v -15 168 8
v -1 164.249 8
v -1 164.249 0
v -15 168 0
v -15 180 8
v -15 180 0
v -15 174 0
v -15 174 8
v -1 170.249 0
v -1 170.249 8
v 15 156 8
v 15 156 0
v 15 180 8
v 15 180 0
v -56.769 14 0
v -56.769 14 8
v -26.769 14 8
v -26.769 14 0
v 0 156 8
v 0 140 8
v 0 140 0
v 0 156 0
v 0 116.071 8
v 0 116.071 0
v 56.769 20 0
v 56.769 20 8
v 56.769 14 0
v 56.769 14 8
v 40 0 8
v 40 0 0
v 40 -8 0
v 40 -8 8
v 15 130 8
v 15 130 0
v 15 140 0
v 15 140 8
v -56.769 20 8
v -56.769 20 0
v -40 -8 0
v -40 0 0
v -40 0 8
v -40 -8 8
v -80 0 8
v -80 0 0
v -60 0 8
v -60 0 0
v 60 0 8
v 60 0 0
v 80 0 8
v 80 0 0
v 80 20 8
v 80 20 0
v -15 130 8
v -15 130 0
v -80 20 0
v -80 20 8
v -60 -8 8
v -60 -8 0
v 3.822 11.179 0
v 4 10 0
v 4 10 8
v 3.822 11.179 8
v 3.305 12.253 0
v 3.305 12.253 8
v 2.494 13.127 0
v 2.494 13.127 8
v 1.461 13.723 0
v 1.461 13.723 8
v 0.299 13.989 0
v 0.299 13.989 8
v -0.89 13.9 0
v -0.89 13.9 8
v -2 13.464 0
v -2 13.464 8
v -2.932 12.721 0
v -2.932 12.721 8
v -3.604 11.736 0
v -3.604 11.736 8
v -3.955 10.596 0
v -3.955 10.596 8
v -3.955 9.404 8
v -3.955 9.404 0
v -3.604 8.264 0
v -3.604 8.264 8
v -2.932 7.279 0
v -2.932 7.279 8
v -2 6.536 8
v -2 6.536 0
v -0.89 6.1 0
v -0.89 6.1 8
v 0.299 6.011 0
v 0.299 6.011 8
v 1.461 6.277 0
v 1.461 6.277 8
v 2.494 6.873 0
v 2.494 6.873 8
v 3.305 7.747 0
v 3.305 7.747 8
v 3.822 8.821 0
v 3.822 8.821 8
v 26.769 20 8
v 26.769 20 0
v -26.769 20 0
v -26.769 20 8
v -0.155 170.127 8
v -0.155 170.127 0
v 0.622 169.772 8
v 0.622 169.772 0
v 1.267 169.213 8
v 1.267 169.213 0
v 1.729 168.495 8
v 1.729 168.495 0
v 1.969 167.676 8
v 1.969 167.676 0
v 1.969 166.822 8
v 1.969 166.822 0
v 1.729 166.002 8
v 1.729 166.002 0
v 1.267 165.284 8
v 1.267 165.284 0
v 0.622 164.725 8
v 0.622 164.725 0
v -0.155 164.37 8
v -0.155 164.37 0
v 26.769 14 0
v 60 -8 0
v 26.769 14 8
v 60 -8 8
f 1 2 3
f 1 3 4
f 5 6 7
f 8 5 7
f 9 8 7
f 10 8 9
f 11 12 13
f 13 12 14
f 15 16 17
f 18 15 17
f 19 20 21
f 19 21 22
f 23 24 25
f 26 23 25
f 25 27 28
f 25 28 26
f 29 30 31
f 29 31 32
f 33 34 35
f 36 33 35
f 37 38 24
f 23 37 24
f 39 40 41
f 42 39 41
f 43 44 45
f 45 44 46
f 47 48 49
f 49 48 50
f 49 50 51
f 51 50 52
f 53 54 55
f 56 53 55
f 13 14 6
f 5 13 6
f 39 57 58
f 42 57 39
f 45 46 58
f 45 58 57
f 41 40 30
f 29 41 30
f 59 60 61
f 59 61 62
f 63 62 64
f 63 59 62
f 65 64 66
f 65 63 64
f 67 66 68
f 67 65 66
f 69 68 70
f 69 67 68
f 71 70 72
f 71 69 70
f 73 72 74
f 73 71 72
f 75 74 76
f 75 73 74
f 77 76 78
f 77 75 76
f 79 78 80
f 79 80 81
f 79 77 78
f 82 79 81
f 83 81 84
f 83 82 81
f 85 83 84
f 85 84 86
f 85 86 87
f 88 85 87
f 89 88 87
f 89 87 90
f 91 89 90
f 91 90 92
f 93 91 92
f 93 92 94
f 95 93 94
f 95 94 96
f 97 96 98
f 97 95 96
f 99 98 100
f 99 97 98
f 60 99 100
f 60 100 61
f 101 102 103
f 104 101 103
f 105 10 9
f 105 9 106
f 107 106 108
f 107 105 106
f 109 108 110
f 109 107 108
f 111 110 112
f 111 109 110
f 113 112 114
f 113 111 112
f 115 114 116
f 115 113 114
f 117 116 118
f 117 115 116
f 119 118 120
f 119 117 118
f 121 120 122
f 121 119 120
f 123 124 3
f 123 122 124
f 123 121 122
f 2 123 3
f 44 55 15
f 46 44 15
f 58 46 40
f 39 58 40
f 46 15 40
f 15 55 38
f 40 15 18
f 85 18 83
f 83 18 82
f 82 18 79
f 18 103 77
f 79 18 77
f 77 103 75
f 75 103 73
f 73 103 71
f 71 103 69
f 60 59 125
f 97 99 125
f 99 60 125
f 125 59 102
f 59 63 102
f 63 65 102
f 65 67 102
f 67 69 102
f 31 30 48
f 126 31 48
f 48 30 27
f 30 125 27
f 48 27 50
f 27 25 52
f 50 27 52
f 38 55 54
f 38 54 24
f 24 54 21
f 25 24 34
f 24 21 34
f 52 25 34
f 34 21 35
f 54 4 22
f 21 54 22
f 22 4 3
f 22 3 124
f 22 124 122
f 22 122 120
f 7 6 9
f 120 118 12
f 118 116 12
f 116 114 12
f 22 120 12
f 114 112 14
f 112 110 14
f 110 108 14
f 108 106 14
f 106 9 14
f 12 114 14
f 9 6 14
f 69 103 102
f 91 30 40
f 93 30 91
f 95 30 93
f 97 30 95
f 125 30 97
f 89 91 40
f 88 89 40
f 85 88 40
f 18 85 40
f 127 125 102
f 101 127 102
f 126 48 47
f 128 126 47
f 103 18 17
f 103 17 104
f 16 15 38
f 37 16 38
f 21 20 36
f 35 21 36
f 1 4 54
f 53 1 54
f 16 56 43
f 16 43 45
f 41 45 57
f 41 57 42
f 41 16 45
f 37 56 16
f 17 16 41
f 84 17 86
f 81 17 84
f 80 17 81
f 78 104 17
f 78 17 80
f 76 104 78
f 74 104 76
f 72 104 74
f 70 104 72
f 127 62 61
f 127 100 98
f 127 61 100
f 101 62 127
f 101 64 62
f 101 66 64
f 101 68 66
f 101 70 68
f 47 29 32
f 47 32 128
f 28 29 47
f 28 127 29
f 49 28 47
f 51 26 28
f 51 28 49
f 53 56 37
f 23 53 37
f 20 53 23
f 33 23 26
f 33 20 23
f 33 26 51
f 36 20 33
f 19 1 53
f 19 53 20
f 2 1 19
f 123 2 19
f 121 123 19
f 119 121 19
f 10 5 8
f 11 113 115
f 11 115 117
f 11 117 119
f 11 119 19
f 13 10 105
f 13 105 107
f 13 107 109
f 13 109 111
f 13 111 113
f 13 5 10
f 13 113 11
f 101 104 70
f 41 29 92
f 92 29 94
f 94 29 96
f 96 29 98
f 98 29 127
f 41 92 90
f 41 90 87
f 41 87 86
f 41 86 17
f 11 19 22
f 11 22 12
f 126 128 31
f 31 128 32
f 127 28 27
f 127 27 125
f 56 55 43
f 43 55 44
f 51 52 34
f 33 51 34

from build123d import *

# Parameters (mm, degrees)
SKETCH1_R           = 4
BOSS_EXTRUDE1_DEPTH = 8
SKETCH2_W           = 20
SKETCH2_H           = 8
BOSS_EXTRUDE2_DEPTH = 8
SKETCH4_W           = 15
SKETCH4_H           = 16
CUT_EXTRUDE1_DEPTH  = 10
SKETCH5_W           = 30
SKETCH5_H           = 6
CUT_EXTRUDE2_DEPTH  = 8
CUT_EXTRUDE4_DEPTH  = 198.139544486


with BuildPart() as part:
    # Sketch1 → Boss-Extrude1 (new body)
    with BuildSketch(Plane.XY):
        Polygon((-80, 0), (80, 0), (80, 20), (15, 130), (15, 180), (-15, 180), (-15, 130), (-80, 20), align=None)
        with Locations((0, 10)):
            Circle(SKETCH1_R, mode=Mode.SUBTRACT)
        Polygon((-56.769213929, 20), (0, 116.070977418), (56.769213929, 20), align=None, mode=Mode.SUBTRACT)
    extrude(amount=BOSS_EXTRUDE1_DEPTH)

    # Sketch2 → Boss-Extrude2 (add)
    with BuildSketch(Plane.XZ):
        with Locations((-50, 4)):
            Rectangle(SKETCH2_W, SKETCH2_H)
    boss_extrude2 = extrude(amount=BOSS_EXTRUDE2_DEPTH)

    # Mirror1: Boss-Extrude2 across plane
    add(boss_extrude2.mirror(Plane(origin=(0, 0, 0), x_dir=(0, 0, 1), z_dir=(1, 0, 0))))

    # Sketch4 → Cut-Extrude1 (cut)
    with BuildSketch(Plane.XY.offset(8)):
        with Locations((7.5, 148)):
            Rectangle(SKETCH4_W, SKETCH4_H)
    extrude(amount=-CUT_EXTRUDE1_DEPTH, mode=Mode.SUBTRACT)

    # Sketch5 → Cut-Extrude2 (cut)
    with BuildSketch(Plane.XY.offset(8)):
        with Locations((-41.769213929, 17)):
            Rectangle(SKETCH5_W, SKETCH5_H)
    cut_extrude2 = extrude(amount=-CUT_EXTRUDE2_DEPTH, mode=Mode.SUBTRACT)

    # Mirror2: Cut-Extrude2 across plane
    add(cut_extrude2.mirror(Plane(origin=(0, 0, 0), x_dir=(0, 0, 1), z_dir=(1, 0, 0))), mode=Mode.SUBTRACT)

    # Sketch7 → Cut-Extrude4 (cut, through all)
    with BuildSketch(Plane.XY.offset(8)):
        with BuildLine():
            Line((-15, 174), (-1, 170.248711306))
            ThreePointArc((-1, 170.248711306), (2, 167.248711306), (-1, 164.248711306))
            Line((-1, 164.248711306), (-15, 168))
            Line((-15, 168), (-15, 174))
        make_face()
    extrude(amount=-CUT_EXTRUDE4_DEPTH, mode=Mode.SUBTRACT)


solid = part.part
